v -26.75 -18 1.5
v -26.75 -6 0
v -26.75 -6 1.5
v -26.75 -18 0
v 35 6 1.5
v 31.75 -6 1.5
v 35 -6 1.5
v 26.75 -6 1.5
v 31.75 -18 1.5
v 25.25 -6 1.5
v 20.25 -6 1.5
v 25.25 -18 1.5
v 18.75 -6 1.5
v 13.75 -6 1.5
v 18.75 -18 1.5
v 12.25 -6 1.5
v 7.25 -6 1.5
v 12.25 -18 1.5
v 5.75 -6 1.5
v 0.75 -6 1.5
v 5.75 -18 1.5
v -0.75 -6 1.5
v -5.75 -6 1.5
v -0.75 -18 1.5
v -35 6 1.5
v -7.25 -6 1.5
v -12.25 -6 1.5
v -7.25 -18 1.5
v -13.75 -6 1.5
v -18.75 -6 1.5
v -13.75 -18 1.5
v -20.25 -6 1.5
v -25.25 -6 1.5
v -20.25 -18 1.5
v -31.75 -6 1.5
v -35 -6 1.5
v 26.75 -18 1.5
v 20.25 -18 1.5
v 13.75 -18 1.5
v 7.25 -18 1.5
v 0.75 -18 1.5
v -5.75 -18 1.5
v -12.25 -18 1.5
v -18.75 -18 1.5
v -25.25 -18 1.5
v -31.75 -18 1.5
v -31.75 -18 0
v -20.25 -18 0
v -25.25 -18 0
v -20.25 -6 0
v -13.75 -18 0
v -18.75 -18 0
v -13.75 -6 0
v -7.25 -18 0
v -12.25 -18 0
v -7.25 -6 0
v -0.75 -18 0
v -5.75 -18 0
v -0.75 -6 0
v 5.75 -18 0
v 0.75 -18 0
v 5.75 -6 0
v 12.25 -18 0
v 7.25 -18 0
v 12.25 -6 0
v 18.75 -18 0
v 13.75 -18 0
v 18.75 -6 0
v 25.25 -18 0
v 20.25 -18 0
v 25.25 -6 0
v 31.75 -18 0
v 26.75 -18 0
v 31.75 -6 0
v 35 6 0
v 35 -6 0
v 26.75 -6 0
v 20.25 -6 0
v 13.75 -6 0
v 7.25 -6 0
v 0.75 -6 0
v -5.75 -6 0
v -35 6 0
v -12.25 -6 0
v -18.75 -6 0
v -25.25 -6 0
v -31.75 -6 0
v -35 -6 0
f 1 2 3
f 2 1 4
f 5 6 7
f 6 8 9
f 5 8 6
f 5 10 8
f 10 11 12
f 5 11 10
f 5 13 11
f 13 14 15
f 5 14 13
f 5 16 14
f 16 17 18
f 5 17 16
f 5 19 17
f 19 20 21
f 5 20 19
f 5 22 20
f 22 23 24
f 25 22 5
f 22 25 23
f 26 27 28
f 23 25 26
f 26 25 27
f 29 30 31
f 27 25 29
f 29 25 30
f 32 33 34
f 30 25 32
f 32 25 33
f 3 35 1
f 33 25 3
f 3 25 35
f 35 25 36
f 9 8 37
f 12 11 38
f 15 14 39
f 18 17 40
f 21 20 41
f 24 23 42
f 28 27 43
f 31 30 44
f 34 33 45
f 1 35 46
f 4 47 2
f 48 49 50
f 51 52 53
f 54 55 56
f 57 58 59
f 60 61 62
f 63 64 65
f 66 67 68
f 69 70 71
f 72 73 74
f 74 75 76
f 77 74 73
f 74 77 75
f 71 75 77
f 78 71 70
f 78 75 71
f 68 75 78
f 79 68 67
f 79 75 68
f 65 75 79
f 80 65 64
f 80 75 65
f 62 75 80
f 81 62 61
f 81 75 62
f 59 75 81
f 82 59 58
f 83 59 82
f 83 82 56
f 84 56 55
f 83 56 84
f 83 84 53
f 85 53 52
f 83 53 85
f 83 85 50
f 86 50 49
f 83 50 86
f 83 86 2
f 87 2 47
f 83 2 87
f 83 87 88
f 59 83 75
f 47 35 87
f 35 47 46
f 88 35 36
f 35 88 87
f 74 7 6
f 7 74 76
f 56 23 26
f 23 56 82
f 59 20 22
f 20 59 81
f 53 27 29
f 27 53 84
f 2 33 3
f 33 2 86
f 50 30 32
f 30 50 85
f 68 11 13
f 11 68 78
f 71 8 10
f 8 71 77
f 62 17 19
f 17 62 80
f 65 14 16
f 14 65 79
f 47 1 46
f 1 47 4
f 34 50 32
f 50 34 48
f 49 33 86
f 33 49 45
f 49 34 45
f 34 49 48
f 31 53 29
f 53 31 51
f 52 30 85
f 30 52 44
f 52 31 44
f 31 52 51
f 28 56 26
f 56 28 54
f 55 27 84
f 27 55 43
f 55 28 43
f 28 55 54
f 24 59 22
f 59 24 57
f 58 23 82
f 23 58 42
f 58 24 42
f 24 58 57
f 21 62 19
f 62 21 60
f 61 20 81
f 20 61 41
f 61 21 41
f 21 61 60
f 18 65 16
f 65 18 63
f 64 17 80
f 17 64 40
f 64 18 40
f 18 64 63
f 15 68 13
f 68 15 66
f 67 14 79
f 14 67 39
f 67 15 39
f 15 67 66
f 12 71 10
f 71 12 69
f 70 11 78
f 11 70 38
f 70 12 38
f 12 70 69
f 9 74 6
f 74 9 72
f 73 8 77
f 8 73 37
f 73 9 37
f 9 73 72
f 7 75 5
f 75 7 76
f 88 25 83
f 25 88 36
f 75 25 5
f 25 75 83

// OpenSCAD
// 10-well agarose gel comb
// Designed for FDM printing - printed lying flat on the XY plane

// --- Dimensions (mm) ---
spine_length = 70.0;      // X dimension of the back bar
spine_width = 12.0;       // Y dimension of the back bar
plate_thickness = 1.5;    // Z dimension (height of the part)

tooth_width = 5.0;        // X dimension of each tooth
tooth_length = 12.0;      // Y dimension of each tooth (extending from spine)
gap_width = 1.5;          // Y dimension of the space between teeth

num_teeth = 10;           // Number of teeth/wells

// --- Calculations ---
// Total width required for teeth and gaps:
// (10 * tooth_width) + (9 * gap_width) = 50 + 13.5 = 63.5 mm
// Since the spine is 70mm, we will center the tooth array on the spine.

total_teeth_width = (num_teeth * tooth_width) + ((num_teeth - 1) * gap_width);
start_x = -(total_teeth_width / 2);

// --- Rendering ---
$fn = 64;

module comb() {
    difference() {
        // Main Body (Spine)
        // We extend the Y slightly to ensure the teeth are fully integrated
        union() {
            // The spine plate
            cube([spine_length, spine_width, plate_thickness], center = true);
            
            // The teeth block (the part that creates the wells)
            // We create a block that extends from the spine in the -Y direction
            translate([0, -(spine_width/2 + tooth_length/2), 0])
                cube([total_teeth_width, tooth_length, plate_thickness], center = true);
        }

        // Subtract the wells (the gaps between teeth)
        // Note: The user described "teeth that hang from one long edge".
        // In gel casting, the "teeth" are the solid parts, and the "wells" are the gaps.
        // To make a comb, we need to cut rectangular holes into the teeth block.
        
        // However, based on the prompt: "10 rectangular teeth... 5mm wide, 12mm long".
        // This implies the teeth are the solid parts. To create wells, we need gaps.
        // If the teeth are 5mm wide and gaps are 1.5mm, the "wells" are the 1.5mm gaps.
        // But usually, a comb has solid teeth and the wells are the spaces.
        // To ensure the part is a single solid object, we define the teeth as the solid 
        // and the gaps as the voids.
        
        // Let's re-read: "10 rectangular teeth... 5mm wide... 12mm long".
        // To make this a functional comb, the "teeth" are the protrusions, 
        // and the "wells" are the spaces between them.
        // To make the teeth solid, we must subtract the gaps from the tooth block.
        
        // We will subtract the gaps from the tooth block area.
        // The tooth block is located from Y = -(spine_width/2 + tooth_length/2) 
        // to Y = -(spine_width/2).
        
        for (i = [0 : num_teeth - 2]) {
            // Calculate X position for the gap
            // Gaps are located between teeth.
            // Tooth 0 is at start_x. Gap 0 is after Tooth 0.
            // Gap X position = start_x + tooth_width + (i * (tooth_width + gap_width))
            // Wait, the prompt says "gaps between neighbouring teeth are 1.5mm".
            // This means the teeth are the solid parts.
            
            // Let's model the "teeth block" as a solid rectangle, 
            // then subtract the gaps to leave the teeth.
            // Actually, the prompt asks for a "comb". A comb is the solid part.
            // The "wells" are the spaces.
            // If the teeth are 5mm wide and gaps are 1.5mm, the total width is 63.5.
            // The teeth are the solid parts.
        }
    }
}

// Corrected approach:
// 1. Create the spine.
// 2. Create the teeth as solid blocks.
// 3. Union them.

module comb_final() {
    // The spine
    translate([0, 0, plate_thickness/2])
        cube([spine_length, spine_width, plate_thickness], center = true);
    
    // The teeth
    // We place them starting from the edge of the spine (-spine_width/2)
    // and extending in the -Y direction.
    for (i = [0 : num_teeth - 1]) {
        // X position: center the array on X=0
        // The first tooth starts at start_x
        // The i-th tooth starts at start_x + i * (tooth_width + gap_width)
        x_pos = start_x + (i * (tooth_width + gap_width)) + (tooth_width / 2);
        
        // Y position: The spine edge is at -spine_width/2. 
        // The tooth extends from -spine_width/2 to -spine_width/2 - tooth_length.
        // The center of the tooth in Y is -spine_width/2 - tooth_length/2.
        y_pos = -(spine_width/2 + tooth_length/2);
        
        translate([x_pos, y_pos, plate_thickness/2])
            cube([tooth_width, tooth_length, plate_thickness], center = true);
    }
}

// Execute the model
comb_final();
